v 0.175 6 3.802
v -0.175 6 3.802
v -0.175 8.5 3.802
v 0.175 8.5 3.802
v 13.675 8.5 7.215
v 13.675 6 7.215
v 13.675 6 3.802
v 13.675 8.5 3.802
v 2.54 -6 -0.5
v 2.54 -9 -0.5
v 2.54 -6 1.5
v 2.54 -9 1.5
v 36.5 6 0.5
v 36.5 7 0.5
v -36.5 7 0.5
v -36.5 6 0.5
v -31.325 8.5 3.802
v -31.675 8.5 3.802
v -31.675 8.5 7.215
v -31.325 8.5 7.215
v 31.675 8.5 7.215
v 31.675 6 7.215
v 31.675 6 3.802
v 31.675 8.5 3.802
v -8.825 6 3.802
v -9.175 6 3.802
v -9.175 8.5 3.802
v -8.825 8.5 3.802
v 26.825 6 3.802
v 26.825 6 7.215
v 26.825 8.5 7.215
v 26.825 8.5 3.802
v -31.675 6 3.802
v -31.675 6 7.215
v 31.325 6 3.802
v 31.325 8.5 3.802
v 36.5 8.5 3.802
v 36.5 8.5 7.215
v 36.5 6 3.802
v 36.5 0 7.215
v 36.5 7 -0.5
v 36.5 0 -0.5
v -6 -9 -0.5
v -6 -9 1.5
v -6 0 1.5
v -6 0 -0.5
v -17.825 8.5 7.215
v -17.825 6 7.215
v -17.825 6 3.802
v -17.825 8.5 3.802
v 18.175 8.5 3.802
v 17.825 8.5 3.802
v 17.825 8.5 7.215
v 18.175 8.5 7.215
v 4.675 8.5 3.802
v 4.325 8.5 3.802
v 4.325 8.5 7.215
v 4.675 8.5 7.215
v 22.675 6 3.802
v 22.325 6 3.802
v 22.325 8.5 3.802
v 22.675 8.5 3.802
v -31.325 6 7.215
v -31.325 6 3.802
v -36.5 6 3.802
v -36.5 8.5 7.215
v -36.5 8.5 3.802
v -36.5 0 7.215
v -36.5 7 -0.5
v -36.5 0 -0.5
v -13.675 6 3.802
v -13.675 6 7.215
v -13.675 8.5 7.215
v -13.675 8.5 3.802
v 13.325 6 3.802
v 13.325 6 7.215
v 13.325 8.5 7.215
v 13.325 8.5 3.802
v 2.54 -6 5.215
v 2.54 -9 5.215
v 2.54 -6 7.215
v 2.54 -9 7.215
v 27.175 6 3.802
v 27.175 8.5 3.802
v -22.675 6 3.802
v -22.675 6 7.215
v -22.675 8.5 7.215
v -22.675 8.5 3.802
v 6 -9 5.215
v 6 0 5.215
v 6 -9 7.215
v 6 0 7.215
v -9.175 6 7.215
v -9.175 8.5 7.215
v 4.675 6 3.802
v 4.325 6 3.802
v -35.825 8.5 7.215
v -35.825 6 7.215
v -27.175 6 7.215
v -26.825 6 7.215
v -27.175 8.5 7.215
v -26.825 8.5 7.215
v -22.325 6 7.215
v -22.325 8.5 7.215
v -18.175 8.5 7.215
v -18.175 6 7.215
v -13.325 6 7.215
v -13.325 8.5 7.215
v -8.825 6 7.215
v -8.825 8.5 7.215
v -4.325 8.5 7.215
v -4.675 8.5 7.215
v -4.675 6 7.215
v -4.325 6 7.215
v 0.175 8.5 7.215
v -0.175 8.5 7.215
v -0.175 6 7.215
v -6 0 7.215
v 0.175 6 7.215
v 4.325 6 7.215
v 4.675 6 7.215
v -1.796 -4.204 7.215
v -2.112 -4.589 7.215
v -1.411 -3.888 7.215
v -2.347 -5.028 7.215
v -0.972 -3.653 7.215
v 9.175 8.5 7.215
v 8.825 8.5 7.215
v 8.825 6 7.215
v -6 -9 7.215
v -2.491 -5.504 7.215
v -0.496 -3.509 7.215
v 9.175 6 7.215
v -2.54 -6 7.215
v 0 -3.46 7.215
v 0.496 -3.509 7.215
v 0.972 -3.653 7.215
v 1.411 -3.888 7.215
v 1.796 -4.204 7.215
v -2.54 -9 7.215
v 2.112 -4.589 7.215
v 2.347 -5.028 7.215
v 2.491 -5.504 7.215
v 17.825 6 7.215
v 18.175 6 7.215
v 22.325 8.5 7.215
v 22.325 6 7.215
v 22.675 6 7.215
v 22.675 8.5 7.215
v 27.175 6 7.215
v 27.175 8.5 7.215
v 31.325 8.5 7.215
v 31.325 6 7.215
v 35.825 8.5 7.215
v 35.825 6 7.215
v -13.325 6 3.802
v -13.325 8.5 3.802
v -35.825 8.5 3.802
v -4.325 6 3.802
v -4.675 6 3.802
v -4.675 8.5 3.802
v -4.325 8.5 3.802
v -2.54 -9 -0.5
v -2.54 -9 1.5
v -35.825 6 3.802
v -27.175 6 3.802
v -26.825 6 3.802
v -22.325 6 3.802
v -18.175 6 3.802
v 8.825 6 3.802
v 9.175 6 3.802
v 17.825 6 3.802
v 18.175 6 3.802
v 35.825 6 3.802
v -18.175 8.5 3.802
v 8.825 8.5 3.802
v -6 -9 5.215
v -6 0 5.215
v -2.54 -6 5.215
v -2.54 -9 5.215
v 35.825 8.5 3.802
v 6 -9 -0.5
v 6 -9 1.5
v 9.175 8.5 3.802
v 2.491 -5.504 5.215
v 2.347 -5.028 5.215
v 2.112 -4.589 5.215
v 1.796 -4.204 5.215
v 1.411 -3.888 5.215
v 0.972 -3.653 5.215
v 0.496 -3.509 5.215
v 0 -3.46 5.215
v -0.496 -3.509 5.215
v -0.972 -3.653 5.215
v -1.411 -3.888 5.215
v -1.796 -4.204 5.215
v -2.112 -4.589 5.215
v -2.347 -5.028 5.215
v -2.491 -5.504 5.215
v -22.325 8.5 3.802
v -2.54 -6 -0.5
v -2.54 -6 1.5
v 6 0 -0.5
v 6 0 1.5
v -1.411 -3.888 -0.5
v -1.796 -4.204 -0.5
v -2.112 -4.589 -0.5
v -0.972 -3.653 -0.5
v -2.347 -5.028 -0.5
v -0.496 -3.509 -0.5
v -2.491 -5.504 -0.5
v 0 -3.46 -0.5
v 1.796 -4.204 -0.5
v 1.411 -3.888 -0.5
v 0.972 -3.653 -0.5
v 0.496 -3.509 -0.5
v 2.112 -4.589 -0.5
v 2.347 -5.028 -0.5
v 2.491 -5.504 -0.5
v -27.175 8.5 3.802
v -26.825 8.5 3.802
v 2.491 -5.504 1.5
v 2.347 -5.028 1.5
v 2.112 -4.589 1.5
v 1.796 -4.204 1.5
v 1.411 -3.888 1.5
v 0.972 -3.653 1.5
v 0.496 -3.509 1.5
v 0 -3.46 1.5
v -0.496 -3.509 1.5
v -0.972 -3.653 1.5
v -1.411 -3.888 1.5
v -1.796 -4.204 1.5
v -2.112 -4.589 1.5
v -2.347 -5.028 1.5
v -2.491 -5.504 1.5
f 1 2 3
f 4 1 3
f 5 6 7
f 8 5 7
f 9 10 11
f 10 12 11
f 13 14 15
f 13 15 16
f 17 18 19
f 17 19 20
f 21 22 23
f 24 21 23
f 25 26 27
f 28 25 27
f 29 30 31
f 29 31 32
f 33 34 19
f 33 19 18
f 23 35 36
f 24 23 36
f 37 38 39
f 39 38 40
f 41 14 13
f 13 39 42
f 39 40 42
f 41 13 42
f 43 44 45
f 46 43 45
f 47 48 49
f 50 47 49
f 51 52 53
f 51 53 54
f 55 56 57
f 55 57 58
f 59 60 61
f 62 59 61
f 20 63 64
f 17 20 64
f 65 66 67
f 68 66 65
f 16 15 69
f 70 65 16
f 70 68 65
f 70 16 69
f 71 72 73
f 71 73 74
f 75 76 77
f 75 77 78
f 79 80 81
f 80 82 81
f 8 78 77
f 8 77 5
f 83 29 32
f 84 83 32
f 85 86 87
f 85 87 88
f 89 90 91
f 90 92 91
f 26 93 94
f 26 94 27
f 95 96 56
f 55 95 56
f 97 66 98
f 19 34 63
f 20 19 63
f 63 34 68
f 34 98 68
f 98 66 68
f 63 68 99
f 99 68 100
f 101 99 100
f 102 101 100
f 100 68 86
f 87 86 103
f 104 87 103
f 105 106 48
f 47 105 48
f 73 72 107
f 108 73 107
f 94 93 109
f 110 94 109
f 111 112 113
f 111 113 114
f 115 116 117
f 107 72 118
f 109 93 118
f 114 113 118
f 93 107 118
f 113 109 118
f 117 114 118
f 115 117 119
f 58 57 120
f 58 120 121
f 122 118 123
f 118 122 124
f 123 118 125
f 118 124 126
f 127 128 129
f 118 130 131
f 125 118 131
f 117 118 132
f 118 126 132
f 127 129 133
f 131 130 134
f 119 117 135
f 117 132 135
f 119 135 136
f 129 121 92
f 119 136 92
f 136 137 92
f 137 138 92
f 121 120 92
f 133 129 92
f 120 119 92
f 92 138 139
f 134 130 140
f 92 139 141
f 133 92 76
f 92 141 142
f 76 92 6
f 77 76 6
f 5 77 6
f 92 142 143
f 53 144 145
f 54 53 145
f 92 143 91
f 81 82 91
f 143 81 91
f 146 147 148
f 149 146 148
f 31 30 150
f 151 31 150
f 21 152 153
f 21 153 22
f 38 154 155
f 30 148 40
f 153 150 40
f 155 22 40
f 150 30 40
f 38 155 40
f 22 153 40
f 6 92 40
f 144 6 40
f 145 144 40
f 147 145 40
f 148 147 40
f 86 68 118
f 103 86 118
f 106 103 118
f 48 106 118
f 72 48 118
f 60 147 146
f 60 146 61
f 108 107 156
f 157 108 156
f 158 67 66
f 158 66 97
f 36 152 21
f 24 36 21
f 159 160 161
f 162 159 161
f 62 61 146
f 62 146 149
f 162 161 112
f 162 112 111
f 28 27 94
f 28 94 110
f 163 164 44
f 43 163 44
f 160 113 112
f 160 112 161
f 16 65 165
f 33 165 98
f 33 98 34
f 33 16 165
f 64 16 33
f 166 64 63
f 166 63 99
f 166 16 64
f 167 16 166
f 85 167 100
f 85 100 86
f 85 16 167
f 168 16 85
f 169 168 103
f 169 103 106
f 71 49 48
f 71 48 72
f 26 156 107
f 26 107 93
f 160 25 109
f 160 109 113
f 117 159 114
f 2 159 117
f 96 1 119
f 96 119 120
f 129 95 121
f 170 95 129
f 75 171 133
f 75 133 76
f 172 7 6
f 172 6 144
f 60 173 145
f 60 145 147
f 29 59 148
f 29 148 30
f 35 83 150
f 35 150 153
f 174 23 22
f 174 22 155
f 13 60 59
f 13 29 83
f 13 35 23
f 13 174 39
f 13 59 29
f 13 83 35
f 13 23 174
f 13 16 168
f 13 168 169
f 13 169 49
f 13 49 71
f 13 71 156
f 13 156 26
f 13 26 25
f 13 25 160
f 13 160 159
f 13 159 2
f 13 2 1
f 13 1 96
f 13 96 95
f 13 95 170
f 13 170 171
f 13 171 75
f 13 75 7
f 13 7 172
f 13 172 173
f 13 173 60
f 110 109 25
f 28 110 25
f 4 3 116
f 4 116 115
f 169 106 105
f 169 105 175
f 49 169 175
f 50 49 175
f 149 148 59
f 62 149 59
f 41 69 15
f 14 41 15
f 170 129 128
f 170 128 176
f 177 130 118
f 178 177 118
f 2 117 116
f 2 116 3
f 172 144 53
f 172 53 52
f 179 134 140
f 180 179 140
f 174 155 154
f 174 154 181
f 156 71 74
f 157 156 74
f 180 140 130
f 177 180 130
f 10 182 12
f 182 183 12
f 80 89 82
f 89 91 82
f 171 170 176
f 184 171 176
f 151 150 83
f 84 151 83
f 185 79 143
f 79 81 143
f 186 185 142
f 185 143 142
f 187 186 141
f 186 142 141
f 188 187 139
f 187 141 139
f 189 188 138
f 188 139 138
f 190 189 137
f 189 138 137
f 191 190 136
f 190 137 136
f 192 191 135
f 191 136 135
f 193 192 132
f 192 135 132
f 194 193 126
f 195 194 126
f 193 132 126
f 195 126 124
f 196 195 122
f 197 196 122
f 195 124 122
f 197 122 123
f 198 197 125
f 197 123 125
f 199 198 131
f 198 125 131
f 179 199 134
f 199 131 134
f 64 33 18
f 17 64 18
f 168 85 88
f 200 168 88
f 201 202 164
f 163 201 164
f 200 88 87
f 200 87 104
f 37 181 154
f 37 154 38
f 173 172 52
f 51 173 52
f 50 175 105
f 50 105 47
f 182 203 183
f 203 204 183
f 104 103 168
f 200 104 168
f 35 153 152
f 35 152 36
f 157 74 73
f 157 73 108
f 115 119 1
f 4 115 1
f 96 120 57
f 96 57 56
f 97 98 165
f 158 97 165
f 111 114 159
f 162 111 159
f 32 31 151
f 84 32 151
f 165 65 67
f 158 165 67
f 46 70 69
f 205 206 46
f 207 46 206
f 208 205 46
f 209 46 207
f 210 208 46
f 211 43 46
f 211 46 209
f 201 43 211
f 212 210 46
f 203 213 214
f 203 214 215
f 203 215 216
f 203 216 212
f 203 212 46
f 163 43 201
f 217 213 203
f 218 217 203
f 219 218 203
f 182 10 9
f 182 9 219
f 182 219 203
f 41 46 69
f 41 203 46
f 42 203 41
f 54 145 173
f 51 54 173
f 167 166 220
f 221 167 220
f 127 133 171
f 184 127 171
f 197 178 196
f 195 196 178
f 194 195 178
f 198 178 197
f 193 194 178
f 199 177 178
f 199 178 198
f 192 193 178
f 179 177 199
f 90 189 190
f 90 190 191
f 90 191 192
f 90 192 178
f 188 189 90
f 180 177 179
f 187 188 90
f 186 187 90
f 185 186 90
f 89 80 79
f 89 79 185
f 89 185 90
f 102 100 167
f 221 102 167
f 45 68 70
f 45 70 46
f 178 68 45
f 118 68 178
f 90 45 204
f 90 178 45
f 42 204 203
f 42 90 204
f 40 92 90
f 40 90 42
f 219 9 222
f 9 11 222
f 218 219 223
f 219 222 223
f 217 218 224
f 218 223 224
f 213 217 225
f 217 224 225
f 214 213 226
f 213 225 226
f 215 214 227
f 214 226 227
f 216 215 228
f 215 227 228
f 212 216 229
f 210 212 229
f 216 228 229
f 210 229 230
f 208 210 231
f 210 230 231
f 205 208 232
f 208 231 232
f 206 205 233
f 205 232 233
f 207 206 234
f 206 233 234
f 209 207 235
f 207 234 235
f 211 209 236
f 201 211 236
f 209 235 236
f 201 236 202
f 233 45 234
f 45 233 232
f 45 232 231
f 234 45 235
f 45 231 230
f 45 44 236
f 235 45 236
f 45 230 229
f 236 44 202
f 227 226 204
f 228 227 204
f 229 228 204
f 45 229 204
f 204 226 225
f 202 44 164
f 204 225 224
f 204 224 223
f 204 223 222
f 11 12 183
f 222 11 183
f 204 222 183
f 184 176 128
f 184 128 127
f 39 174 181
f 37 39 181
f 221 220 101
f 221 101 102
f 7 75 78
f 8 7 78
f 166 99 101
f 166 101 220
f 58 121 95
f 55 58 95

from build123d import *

# Parameters (mm, degrees)
SKETCH1_W                       = 73
SKETCH1_H                       = 7.715
BOSS_EXTRUDE1_DEPTH             = 6
SKETCH2_W                       = 73
SKETCH2_H                       = 1
BOSS_EXTRUDE2_DEPTH             = 1
SKETCH3_W                       = 0.35
SKETCH3_H                       = 7.715
BOSS_EXTRUDE3_DEPTH             = 2.5
BOSS_EXTRUDE4_REACH             = 40.165
SKETCH4_W                       = 0.325
SKETCH4_H                       = 2.5
BOSS_EXTRUDE4_DIRECTION_2_REACH = 40.165
BOSS_EXTRUDE5_REACH             = 40.165
BOSS_EXTRUDE5_DIRECTION_2_REACH = 40.165
SKETCH6_W                       = 12
SKETCH6_H                       = 3.715
CUT_EXTRUDE1_DEPTH              = 9
CUT_EXTRUDE2_DEPTH              = 39.279318502
CUT_EXTRUDE2_DEPTH_BACK         = 39.279318502


with BuildPart() as part:
    # Sketch1 → Boss-Extrude1 (new body)
    with BuildSketch(Plane(origin=(0, 0, 0), x_dir=(1, 0, 0), z_dir=(0, 1, 0))):
        with Locations((0, -3.3575)):
            Rectangle(SKETCH1_W, SKETCH1_H)
    extrude(amount=BOSS_EXTRUDE1_DEPTH)

    # Sketch2 → Boss-Extrude2 (add)
    with BuildSketch(Plane(origin=(0, 6, 0), x_dir=(1, 0, 0), z_dir=(0, 1, 0))):
        Rectangle(SKETCH2_W, SKETCH2_H)
    extrude(amount=BOSS_EXTRUDE2_DEPTH)

    # Sketch3 → Boss-Extrude3 (add)
    with BuildSketch(Plane(origin=(0, 6, 0), x_dir=(1, 0, 0), z_dir=(0, 1, 0))):
        with Locations((4.5, -3.3575)):
            Rectangle(SKETCH3_W, SKETCH3_H)
        with Locations((0, -3.3575)):
            Rectangle(SKETCH3_W, SKETCH3_H)
        with Locations((9, -3.3575)):
            Rectangle(SKETCH3_W, SKETCH3_H)
        with Locations((13.5, -3.3575)):
            Rectangle(SKETCH3_W, SKETCH3_H)
        with Locations((18, -3.3575)):
            Rectangle(SKETCH3_W, SKETCH3_H)
        with Locations((22.5, -3.3575)):
            Rectangle(SKETCH3_W, SKETCH3_H)
        with Locations((27, -3.3575)):
            Rectangle(SKETCH3_W, SKETCH3_H)
        with Locations((31.5, -3.3575)):
            Rectangle(SKETCH3_W, SKETCH3_H)
        with Locations((36, -3.3575)):
            Rectangle(SKETCH3_W, SKETCH3_H)
        with Locations((-4.5, -3.3575)):
            Rectangle(SKETCH3_W, SKETCH3_H)
        with Locations((-9, -3.3575)):
            Rectangle(SKETCH3_W, SKETCH3_H)
        with Locations((-13.5, -3.3575)):
            Rectangle(SKETCH3_W, SKETCH3_H)
        with Locations((-18, -3.3575)):
            Rectangle(SKETCH3_W, SKETCH3_H)
        with Locations((-22.5, -3.3575)):
            Rectangle(SKETCH3_W, SKETCH3_H)
        with Locations((-27, -3.3575)):
            Rectangle(SKETCH3_W, SKETCH3_H)
        with Locations((-31.5, -3.3575)):
            Rectangle(SKETCH3_W, SKETCH3_H)
        with Locations((-36, -3.3575)):
            Rectangle(SKETCH3_W, SKETCH3_H)
    extrude(amount=BOSS_EXTRUDE3_DEPTH)

    # Boss-Extrude4: up to this face of the body (flat: up to its plane)
    boss_extrude4_end = Plane(part.part.faces().sort_by_distance((0, 3.139594259, 7.215))[0])
    # Sketch4 → Boss-Extrude4 (add, up to the picked face)
    with BuildSketch(Plane.XY, mode=Mode.PRIVATE) as boss_extrude4_sk1:
        with Locations((36.3375, 7.25)):
            Rectangle(SKETCH4_W, SKETCH4_H)
    boss_extrude4_tool1 = split(extrude(boss_extrude4_sk1.sketch, amount=BOSS_EXTRUDE4_REACH, mode=Mode.PRIVATE), bisect_by=boss_extrude4_end, keep=Keep.BOTH, mode=Mode.PRIVATE)
    # Sketch4 → Boss-Extrude4 (add, up to the picked face)
    with BuildSketch(Plane.XY, mode=Mode.PRIVATE) as boss_extrude4_sk2:
        with Locations((-36.3375, 7.25)):
            Rectangle(SKETCH4_W, SKETCH4_H)
    boss_extrude4_tool2 = split(extrude(boss_extrude4_sk2.sketch, amount=BOSS_EXTRUDE4_REACH, mode=Mode.PRIVATE), bisect_by=boss_extrude4_end, keep=Keep.BOTH, mode=Mode.PRIVATE)
    add(boss_extrude4_tool1.solids().sort_by(Axis((36.3375, 7.25, 0), (0, 0, 1)))[0])
    add(boss_extrude4_tool2.solids().sort_by(Axis((-36.3375, 7.25, 0), (0, 0, 1)))[0])

    # Boss-Extrude4 direction 2: up to this face of the body (flat: up to its plane)
    boss_extrude4_direction_2_end = Plane(part.part.faces().sort_by_distance((0, 3.572955234, -0.5))[0])
    # Sketch4 → Boss-Extrude4 direction 2 (add, up to the picked face)
    with BuildSketch(Plane.XY, mode=Mode.PRIVATE) as boss_extrude4_direction_2_sk1:
        with Locations((36.3375, 7.25)):
            Rectangle(SKETCH4_W, SKETCH4_H)
    boss_extrude4_direction_2_tool1 = split(extrude(boss_extrude4_direction_2_sk1.sketch, amount=-BOSS_EXTRUDE4_DIRECTION_2_REACH, mode=Mode.PRIVATE), bisect_by=boss_extrude4_direction_2_end, keep=Keep.BOTH, mode=Mode.PRIVATE)
    # Sketch4 → Boss-Extrude4 direction 2 (add, up to the picked face)
    with BuildSketch(Plane.XY, mode=Mode.PRIVATE) as boss_extrude4_direction_2_sk2:
        with Locations((-36.3375, 7.25)):
            Rectangle(SKETCH4_W, SKETCH4_H)
    boss_extrude4_direction_2_tool2 = split(extrude(boss_extrude4_direction_2_sk2.sketch, amount=-BOSS_EXTRUDE4_DIRECTION_2_REACH, mode=Mode.PRIVATE), bisect_by=boss_extrude4_direction_2_end, keep=Keep.BOTH, mode=Mode.PRIVATE)
    add(boss_extrude4_direction_2_tool1.solids().sort_by(Axis((36.3375, 7.25, 0), (0, 0, -1)))[0])
    add(boss_extrude4_direction_2_tool2.solids().sort_by(Axis((-36.3375, 7.25, 0), (0, 0, -1)))[0])

    # Boss-Extrude5: up to this face of the body (flat: up to its plane)
    boss_extrude5_end = Plane(part.part.faces().sort_by_distance((0, 3.154290429, 7.215))[0])
    # Sketch5 → Boss-Extrude5 (add, up to the picked face)
    with BuildSketch(Plane.XY, mode=Mode.PRIVATE) as boss_extrude5_sk1:
        with BuildLine():
            Line((-2.54, -6), (-2.54, -9))
            Line((-2.54, -9), (-6, -9))
            Line((-6, -9), (-6, 0))
            Line((-6, 0), (6, 0))
            Line((6, 0), (6, -9))
            Line((6, -9), (2.54, -9))
            Line((2.54, -9), (2.54, -6))
            ThreePointArc((2.54, -6), (0, -3.46), (-2.54, -6))
        make_face()
    boss_extrude5_tool1 = split(extrude(boss_extrude5_sk1.sketch, amount=BOSS_EXTRUDE5_REACH, mode=Mode.PRIVATE), bisect_by=boss_extrude5_end, keep=Keep.BOTH, mode=Mode.PRIVATE)
    add(boss_extrude5_tool1.solids().sort_by(Axis((-2.69, -7.5, 0), (0, 0, 1)))[0])

    # Boss-Extrude5 direction 2: up to this face of the body (flat: up to its plane)
    boss_extrude5_direction_2_end = Plane(part.part.faces().sort_by_distance((0, 3.580773661, -0.5))[0])
    # Sketch5 → Boss-Extrude5 direction 2 (add, up to the picked face)
    with BuildSketch(Plane.XY, mode=Mode.PRIVATE) as boss_extrude5_direction_2_sk1:
        with BuildLine():
            Line((-2.54, -6), (-2.54, -9))
            Line((-2.54, -9), (-6, -9))
            Line((-6, -9), (-6, 0))
            Line((-6, 0), (6, 0))
            Line((6, 0), (6, -9))
            Line((6, -9), (2.54, -9))
            Line((2.54, -9), (2.54, -6))
            ThreePointArc((2.54, -6), (0, -3.46), (-2.54, -6))
        make_face()
    boss_extrude5_direction_2_tool1 = split(extrude(boss_extrude5_direction_2_sk1.sketch, amount=-BOSS_EXTRUDE5_DIRECTION_2_REACH, mode=Mode.PRIVATE), bisect_by=boss_extrude5_direction_2_end, keep=Keep.BOTH, mode=Mode.PRIVATE)
    add(boss_extrude5_direction_2_tool1.solids().sort_by(Axis((-2.69, -7.5, 0), (0, 0, -1)))[0])

    # Sketch6 → Cut-Extrude1 (cut)
    with BuildSketch(Plane.XZ.offset(9)):
        with Locations((0, 3.3575)):
            Rectangle(SKETCH6_W, SKETCH6_H)
    extrude(amount=-CUT_EXTRUDE1_DEPTH, mode=Mode.SUBTRACT)

    # Sketch7 → Cut-Extrude2 (cut, two sides: drawn at the far end of the back side and taken through both)
    with BuildSketch(Plane(origin=(0, 0, 0), x_dir=(0, 0, -1), z_dir=(1, 0, 0)).offset(-CUT_EXTRUDE2_DEPTH_BACK)):
        Polygon((0.5, 7), (-0.5, 7), (-0.5, 6), (-3.802, 6), (-3.802, 8.5), (0.5, 8.5), align=None)
    extrude(amount=CUT_EXTRUDE2_DEPTH + CUT_EXTRUDE2_DEPTH_BACK, mode=Mode.SUBTRACT)


solid = part.part
